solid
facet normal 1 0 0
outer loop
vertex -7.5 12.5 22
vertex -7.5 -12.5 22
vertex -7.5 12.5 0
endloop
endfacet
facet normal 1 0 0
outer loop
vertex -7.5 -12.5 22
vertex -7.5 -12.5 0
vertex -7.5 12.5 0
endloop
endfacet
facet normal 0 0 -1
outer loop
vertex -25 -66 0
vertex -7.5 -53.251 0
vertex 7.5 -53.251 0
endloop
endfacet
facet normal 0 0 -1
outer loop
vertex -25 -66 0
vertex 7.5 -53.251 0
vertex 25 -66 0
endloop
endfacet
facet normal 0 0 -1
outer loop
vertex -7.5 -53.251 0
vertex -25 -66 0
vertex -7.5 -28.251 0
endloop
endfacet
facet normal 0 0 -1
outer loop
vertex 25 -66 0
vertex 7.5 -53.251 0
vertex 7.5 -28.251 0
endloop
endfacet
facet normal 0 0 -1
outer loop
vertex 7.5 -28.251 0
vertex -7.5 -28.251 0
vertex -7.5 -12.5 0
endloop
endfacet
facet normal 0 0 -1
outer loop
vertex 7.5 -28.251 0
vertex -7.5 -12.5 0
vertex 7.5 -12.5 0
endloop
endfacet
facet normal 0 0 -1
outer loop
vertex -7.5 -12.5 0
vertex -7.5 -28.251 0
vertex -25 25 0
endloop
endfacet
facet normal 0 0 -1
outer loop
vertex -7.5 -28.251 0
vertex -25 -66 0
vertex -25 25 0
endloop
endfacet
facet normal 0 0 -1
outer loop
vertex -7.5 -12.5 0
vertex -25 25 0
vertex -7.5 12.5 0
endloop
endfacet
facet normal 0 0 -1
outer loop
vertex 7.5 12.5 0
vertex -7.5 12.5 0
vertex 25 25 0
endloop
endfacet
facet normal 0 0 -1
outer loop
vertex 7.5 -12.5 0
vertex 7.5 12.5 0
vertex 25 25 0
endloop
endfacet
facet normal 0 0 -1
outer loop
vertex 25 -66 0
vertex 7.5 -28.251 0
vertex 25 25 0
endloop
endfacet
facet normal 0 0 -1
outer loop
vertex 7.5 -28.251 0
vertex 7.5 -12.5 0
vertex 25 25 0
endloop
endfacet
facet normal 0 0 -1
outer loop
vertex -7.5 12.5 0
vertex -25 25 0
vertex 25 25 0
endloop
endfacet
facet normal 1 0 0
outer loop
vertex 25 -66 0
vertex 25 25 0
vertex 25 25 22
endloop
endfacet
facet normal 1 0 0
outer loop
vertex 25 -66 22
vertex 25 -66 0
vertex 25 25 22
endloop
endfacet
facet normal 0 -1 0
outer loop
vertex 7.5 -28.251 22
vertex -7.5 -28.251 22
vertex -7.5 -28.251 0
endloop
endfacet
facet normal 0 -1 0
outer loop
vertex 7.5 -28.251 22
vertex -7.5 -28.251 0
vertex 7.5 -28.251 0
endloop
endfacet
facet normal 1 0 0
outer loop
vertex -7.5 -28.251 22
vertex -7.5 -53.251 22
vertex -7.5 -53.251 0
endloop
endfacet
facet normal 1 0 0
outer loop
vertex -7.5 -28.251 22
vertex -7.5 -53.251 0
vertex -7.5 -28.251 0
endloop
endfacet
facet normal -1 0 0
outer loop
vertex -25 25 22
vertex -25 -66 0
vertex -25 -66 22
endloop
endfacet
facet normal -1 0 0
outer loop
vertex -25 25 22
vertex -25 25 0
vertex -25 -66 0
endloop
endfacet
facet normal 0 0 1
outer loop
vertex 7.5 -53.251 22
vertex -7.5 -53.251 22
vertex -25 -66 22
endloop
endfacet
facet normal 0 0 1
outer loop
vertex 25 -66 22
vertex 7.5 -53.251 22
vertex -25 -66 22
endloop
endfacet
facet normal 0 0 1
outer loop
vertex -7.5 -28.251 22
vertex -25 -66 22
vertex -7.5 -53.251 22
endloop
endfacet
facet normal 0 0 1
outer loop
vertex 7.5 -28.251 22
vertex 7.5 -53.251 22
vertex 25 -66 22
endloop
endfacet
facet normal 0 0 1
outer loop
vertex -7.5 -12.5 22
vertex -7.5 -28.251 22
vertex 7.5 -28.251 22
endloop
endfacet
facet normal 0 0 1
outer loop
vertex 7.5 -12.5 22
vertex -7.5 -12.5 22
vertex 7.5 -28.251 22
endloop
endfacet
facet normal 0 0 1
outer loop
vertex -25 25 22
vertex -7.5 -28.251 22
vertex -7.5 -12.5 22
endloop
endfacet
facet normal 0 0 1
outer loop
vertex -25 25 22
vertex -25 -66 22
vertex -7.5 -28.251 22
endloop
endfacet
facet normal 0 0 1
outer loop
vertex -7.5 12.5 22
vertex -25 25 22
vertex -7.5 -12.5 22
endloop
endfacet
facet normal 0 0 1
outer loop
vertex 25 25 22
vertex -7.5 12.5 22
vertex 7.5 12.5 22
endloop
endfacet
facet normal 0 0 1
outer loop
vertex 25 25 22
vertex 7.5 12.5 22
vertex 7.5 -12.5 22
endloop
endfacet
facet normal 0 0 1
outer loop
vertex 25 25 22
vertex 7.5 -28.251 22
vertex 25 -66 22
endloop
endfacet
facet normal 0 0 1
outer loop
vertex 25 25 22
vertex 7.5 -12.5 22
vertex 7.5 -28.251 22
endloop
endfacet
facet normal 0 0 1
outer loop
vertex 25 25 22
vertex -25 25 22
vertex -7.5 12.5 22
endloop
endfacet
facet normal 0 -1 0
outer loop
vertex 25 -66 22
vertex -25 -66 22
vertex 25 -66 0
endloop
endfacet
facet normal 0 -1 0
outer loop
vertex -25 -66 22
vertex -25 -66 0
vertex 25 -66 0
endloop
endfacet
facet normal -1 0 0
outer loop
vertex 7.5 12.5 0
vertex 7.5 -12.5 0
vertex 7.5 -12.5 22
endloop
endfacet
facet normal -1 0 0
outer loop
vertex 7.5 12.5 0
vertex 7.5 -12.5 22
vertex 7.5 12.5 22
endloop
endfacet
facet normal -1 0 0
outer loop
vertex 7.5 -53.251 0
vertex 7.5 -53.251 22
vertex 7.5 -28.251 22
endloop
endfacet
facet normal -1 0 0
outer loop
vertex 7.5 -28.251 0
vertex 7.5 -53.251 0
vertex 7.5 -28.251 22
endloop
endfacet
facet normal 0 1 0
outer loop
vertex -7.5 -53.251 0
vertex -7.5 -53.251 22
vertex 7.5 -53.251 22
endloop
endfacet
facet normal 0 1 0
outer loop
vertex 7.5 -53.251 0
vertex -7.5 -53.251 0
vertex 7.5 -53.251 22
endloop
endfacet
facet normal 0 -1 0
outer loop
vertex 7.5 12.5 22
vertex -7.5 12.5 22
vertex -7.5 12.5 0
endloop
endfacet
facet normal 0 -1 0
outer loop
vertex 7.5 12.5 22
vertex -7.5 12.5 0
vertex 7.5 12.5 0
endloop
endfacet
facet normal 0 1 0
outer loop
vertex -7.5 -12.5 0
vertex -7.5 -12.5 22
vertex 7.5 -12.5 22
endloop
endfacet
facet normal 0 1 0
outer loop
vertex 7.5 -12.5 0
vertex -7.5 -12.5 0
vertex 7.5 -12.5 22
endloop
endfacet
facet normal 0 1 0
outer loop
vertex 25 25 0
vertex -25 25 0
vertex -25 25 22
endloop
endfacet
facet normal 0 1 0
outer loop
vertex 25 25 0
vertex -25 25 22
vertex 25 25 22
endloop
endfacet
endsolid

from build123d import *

# Parameters (mm, degrees)
F0_W     = 50
F0_H     = 50
F1_DEPTH = 5
F2_W     = 15
F2_H     = 25
F3_DEPTH = 169
F4_DEPTH = 17
F5_DEPTH = 41
F6_W     = 15
F6_H     = 25
F7_DEPTH = 141


with BuildPart() as f1:
    # F0 (on Top) → F1 (new body)
    with BuildSketch(Plane.XY):
        Rectangle(F0_W, F0_H)
    extrude(amount=F1_DEPTH)

    # F2 (on face) → F3 (cut)
    with BuildSketch(Plane.XY.offset(5)):
        Rectangle(F2_W, F2_H)
    extrude(amount=-F3_DEPTH, mode=Mode.SUBTRACT)

    # F4 (add): a face of the model
    f4_faces = [f1.faces().sort_by_distance(p)[0] for p in [
        (0, -24.2928932188, 5),
    ]]
    extrude(f4_faces, amount=F4_DEPTH)

    # F5 (add): a face of the model
    f5_faces = [f1.faces().sort_by_distance(p)[0] for p in [
        (0, -25, 11),
    ]]
    extrude(f5_faces, amount=F5_DEPTH)

    # F6 (on face) → F7 (cut)
    with BuildSketch(Plane.XY.offset(22)):
        with Locations((0, -40.7508090138)):
            Rectangle(F6_W, F6_H)
    extrude(amount=-F7_DEPTH, mode=Mode.SUBTRACT)


solid = f1.part
